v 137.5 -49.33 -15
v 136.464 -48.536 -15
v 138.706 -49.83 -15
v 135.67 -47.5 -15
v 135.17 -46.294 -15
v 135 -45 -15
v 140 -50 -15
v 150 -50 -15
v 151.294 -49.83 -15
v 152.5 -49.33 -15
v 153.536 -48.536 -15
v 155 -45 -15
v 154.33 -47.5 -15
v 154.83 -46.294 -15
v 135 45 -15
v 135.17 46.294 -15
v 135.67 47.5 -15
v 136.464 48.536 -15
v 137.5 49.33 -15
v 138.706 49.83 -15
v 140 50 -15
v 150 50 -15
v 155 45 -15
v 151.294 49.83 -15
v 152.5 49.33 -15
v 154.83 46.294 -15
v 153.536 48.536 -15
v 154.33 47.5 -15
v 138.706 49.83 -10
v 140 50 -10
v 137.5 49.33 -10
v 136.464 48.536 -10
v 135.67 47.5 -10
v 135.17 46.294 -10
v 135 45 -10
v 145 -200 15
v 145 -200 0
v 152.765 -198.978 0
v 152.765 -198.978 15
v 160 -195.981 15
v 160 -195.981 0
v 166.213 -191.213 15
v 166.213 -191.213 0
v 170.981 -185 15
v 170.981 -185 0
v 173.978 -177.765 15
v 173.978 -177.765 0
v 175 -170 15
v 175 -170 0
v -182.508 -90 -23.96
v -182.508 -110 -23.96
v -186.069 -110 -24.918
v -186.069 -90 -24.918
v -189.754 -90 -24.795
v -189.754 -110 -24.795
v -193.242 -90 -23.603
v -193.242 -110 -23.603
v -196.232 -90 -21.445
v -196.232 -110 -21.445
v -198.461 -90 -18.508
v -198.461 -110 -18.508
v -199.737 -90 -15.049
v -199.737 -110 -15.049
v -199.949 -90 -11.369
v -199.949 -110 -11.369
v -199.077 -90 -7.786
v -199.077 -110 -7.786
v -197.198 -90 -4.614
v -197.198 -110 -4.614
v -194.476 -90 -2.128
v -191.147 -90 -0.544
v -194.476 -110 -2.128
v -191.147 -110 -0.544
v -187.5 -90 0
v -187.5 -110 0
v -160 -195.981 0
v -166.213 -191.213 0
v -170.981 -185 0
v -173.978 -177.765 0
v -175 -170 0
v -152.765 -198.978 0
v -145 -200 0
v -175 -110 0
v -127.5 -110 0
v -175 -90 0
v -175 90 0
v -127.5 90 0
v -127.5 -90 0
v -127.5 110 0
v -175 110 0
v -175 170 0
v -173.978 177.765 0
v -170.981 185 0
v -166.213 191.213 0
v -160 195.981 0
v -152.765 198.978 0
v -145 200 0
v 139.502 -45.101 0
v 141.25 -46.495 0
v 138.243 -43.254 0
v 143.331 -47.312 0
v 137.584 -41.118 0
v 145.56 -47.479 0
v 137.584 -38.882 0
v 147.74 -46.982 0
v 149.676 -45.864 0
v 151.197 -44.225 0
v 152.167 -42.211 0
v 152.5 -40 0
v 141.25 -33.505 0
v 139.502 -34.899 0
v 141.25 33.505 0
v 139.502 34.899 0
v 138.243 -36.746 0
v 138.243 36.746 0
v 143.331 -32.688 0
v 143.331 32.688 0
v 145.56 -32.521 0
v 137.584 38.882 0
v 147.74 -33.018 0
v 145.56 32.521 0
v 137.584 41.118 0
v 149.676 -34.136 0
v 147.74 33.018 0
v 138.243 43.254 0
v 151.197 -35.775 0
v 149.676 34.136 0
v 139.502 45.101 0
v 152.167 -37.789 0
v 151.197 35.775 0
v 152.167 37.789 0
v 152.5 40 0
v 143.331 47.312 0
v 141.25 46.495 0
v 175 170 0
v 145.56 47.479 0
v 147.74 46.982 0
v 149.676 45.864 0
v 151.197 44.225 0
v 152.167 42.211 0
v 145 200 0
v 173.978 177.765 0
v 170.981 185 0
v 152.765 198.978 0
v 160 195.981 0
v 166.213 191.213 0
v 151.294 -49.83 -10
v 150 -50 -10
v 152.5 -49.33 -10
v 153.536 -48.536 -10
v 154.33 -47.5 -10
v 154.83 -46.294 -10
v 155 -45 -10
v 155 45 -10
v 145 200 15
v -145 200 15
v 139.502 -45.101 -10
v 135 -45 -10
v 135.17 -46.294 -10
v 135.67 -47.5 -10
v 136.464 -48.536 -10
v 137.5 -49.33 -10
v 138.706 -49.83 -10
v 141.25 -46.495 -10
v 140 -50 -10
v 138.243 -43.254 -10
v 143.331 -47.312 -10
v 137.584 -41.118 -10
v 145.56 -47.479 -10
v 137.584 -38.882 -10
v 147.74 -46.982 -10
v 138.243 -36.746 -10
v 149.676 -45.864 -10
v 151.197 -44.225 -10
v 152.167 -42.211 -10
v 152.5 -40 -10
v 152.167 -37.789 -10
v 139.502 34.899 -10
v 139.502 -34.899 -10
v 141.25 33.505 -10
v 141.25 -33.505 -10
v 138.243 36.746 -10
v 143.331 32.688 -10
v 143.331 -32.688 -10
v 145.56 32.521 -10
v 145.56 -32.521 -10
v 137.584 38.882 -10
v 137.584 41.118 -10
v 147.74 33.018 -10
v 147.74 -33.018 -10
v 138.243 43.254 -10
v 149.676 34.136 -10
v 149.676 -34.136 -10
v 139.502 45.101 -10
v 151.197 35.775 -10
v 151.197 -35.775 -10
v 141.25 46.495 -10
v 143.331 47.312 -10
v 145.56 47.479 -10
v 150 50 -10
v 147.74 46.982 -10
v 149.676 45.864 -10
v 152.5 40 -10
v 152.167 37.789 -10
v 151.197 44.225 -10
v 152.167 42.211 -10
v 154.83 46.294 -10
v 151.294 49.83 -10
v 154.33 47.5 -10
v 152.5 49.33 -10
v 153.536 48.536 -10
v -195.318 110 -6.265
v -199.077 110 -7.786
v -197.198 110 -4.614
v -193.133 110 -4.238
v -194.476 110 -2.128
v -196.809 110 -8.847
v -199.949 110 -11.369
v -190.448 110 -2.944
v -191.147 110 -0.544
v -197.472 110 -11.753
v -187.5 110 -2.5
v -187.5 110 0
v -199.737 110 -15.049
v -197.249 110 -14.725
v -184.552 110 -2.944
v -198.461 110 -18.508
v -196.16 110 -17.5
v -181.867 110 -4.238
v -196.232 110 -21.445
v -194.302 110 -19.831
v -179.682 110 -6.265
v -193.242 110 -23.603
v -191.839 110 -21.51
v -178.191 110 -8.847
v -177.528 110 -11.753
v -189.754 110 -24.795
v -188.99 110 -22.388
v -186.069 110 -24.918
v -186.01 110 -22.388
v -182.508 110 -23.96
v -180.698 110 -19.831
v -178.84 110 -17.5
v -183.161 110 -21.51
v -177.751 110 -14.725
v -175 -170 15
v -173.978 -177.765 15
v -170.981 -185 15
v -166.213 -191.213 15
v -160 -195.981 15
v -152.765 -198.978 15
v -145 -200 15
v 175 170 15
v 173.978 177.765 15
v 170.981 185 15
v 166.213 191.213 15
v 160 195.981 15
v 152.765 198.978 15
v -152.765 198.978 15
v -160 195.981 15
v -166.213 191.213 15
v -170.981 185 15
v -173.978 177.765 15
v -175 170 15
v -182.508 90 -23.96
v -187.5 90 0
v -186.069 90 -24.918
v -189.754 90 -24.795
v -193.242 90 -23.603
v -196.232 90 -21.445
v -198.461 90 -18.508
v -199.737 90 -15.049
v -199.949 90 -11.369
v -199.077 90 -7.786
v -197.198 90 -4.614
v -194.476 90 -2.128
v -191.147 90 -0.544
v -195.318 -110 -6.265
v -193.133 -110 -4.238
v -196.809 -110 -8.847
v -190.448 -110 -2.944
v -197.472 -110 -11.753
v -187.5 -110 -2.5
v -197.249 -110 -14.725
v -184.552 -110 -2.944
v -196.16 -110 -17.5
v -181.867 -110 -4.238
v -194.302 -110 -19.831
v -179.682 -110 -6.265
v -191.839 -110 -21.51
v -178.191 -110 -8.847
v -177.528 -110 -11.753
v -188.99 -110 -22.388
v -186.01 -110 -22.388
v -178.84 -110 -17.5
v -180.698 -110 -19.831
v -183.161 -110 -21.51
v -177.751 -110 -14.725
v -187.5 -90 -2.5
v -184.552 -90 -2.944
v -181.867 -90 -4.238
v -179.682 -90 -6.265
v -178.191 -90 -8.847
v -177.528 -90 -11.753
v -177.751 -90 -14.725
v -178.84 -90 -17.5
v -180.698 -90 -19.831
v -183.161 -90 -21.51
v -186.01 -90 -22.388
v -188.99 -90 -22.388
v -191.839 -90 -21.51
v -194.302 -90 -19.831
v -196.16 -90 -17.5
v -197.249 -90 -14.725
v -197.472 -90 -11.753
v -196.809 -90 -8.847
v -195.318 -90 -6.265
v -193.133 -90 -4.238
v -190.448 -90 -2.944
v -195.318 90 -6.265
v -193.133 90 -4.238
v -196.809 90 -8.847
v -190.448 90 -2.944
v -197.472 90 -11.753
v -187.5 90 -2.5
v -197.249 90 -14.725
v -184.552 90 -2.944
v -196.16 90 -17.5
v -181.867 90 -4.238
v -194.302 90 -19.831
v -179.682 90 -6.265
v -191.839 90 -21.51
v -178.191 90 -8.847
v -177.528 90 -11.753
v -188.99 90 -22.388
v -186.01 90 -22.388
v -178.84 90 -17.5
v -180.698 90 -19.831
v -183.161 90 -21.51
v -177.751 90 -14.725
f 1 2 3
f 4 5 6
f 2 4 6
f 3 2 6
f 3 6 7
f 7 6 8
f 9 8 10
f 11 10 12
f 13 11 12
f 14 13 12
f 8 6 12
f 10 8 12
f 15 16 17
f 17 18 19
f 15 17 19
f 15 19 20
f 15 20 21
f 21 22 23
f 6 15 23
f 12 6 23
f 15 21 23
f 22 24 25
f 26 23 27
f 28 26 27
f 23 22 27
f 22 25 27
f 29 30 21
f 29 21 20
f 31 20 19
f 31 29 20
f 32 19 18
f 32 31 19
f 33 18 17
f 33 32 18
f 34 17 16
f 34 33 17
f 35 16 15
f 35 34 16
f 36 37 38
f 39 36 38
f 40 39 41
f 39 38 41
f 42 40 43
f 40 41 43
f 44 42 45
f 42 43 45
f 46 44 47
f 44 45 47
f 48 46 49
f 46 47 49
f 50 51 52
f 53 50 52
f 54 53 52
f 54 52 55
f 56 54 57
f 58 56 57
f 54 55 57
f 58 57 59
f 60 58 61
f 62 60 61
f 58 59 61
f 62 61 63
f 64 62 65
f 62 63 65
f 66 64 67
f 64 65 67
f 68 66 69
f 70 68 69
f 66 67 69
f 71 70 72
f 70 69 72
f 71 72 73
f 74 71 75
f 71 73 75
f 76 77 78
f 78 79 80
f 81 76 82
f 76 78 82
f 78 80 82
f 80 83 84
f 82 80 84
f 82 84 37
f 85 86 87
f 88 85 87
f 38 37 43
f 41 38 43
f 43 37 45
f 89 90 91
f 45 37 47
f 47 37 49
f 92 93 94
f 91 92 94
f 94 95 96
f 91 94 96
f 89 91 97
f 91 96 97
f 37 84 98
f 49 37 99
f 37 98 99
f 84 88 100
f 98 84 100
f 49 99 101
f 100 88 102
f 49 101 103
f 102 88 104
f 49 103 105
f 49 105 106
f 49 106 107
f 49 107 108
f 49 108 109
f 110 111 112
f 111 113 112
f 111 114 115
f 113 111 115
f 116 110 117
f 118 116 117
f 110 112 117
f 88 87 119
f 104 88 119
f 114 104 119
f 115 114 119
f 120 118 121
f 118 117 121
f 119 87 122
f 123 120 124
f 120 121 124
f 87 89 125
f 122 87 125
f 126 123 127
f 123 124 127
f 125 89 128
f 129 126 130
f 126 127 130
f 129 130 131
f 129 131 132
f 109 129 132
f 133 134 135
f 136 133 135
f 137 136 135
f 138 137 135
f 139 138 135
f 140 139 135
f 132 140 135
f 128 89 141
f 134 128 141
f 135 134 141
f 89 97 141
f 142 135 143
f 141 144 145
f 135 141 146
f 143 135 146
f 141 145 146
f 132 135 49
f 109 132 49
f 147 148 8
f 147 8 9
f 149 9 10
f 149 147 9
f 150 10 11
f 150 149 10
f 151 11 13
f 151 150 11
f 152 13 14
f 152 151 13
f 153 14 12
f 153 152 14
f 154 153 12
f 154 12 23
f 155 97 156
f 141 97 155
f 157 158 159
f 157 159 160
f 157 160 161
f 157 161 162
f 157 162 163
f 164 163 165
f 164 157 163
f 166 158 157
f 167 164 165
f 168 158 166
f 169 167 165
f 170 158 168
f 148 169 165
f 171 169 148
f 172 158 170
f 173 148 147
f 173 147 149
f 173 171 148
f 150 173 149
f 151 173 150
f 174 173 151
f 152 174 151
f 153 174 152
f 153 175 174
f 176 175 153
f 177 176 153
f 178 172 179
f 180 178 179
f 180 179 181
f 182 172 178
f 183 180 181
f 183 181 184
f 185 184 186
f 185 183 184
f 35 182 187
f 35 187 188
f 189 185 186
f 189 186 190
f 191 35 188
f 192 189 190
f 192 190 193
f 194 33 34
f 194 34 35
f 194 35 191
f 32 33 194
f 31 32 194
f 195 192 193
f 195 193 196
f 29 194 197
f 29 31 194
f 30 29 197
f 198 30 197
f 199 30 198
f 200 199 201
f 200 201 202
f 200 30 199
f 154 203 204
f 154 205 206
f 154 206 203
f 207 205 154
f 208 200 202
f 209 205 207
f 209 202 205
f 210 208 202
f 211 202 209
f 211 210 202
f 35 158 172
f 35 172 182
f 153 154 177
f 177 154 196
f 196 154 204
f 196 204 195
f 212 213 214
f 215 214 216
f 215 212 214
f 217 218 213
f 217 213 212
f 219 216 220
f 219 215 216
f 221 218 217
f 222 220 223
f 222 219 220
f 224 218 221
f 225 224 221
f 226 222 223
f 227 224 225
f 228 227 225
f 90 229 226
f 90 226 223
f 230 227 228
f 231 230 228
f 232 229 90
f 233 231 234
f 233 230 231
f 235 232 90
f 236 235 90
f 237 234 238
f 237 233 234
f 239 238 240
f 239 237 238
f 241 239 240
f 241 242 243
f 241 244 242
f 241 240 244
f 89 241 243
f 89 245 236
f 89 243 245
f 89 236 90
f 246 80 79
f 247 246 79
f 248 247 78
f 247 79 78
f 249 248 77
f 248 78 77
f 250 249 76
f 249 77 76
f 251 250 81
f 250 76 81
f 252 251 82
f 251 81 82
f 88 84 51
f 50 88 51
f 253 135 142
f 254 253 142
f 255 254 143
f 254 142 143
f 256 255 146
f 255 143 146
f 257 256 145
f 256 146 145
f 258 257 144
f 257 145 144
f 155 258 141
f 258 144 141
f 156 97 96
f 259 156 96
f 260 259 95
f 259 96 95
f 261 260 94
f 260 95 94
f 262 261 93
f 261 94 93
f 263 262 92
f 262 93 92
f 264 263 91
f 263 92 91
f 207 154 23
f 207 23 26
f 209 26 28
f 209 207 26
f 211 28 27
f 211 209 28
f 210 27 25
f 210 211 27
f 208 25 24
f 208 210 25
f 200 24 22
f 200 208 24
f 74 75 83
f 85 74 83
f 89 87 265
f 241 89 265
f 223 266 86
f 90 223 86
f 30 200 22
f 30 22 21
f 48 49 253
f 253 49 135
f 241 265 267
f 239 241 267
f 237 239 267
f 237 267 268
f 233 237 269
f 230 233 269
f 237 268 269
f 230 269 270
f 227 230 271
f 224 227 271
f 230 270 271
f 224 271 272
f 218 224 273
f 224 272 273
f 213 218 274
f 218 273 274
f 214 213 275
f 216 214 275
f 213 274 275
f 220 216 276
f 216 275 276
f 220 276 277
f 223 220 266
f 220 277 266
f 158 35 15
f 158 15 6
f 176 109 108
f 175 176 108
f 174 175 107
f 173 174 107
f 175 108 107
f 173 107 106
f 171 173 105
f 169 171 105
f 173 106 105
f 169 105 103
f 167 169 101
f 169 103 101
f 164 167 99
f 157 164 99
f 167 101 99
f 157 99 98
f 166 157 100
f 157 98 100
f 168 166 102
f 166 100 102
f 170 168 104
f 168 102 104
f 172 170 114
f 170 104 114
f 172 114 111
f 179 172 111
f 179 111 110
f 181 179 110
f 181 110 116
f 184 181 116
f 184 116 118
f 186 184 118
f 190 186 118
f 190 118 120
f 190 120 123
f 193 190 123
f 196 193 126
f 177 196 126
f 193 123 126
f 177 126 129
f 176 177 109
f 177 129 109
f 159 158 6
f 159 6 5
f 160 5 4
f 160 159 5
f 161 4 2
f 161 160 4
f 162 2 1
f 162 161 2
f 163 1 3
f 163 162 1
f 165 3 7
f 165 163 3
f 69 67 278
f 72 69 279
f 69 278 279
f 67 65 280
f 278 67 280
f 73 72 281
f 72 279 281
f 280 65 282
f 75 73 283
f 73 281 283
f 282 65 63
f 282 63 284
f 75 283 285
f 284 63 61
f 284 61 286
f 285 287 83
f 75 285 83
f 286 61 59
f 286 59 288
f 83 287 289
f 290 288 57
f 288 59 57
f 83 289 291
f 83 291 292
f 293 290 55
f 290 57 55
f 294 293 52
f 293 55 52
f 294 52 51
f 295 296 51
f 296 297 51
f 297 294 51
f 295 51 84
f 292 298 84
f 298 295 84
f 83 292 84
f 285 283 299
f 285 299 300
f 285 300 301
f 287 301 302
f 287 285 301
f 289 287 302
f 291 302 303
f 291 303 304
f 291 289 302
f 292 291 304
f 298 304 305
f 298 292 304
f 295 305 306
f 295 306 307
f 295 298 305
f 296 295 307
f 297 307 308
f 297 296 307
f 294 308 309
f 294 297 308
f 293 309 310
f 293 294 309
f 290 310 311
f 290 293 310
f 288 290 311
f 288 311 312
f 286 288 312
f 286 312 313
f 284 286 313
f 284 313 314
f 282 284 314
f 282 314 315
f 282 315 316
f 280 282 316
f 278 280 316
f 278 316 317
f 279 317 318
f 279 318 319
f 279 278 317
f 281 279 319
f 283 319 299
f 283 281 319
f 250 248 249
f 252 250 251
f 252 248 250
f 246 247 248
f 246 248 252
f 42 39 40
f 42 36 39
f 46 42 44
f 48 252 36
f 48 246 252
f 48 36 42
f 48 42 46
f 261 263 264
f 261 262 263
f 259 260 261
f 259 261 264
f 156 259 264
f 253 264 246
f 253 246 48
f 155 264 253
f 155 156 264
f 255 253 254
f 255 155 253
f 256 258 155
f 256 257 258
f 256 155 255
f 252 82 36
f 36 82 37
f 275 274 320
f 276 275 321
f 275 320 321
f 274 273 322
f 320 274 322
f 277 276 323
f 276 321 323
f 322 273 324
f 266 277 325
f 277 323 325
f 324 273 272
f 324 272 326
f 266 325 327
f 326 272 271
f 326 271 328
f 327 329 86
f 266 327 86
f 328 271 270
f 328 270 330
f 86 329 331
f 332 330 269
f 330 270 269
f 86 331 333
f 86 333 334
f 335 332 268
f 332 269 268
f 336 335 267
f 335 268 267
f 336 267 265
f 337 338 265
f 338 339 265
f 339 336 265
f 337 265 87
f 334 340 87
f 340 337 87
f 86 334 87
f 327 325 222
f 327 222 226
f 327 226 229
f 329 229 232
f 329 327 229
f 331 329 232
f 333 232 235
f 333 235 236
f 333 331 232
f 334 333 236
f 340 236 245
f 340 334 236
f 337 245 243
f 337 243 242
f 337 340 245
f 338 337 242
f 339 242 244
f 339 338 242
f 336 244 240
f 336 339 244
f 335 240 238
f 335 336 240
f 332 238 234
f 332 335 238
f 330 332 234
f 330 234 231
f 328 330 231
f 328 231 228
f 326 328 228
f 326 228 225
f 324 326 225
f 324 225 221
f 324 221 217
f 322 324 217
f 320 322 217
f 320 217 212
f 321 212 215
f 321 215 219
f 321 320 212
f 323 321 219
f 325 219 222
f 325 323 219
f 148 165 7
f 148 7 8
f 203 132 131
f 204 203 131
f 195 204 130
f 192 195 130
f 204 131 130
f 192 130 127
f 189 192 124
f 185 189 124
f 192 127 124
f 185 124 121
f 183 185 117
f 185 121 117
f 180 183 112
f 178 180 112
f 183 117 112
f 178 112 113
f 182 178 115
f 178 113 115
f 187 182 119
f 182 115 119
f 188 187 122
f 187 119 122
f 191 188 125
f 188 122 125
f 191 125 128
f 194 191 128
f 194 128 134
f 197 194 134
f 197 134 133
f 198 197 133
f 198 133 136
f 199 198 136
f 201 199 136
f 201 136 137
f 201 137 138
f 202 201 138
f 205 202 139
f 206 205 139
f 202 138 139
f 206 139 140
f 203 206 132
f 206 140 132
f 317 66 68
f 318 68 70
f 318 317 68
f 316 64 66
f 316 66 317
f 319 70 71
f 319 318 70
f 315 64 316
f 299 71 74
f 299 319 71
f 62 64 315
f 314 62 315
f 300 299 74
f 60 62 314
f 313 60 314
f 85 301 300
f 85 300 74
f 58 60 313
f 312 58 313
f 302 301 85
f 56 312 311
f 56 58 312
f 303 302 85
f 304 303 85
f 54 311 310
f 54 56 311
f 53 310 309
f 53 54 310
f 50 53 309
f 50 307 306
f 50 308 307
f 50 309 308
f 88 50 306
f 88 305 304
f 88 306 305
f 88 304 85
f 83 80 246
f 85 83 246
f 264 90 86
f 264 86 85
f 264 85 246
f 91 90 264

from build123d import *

# Parameters (mm, degrees)
SKETCH1_W                = 350
SKETCH1_H                = 400
BOSS_EXTRUDE1_DEPTH      = 15
BOSS_EXTRUDE2_DEPTH      = 10
BOSS_EXTRUDE2_DEPTH_BACK = 10
SKETCH3_R                = 12.5
SKETCH3_R_2              = 10
BOSS_EXTRUDE3_DEPTH      = 10
BOSS_EXTRUDE3_DEPTH_BACK = 10
SKETCH4_R                = 12.5
SKETCH4_R_2              = 10
CUT_EXTRUDE1_DEPTH       = 74
SKETCH6_R                = 7.5
BOSS_EXTRUDE4_DEPTH      = 10
BOSS_EXTRUDE5_DEPTH      = 5


with BuildPart() as part:
    # Sketch1 → Boss-Extrude1 (new body)
    with BuildSketch(Plane.XY):
        Rectangle(SKETCH1_W, SKETCH1_H)
    extrude(amount=BOSS_EXTRUDE1_DEPTH)

    # Sketch3 → Boss-Extrude2 (add, two sides: drawn at the far end of the back side and taken through both)
    # profile 1 of 2: a face of its own
    with BuildSketch(Plane(origin=(0, 100, 0), x_dir=(1, 0, 0), z_dir=(0, 1, 0)).offset(-BOSS_EXTRUDE2_DEPTH_BACK)):
        with BuildLine():
            ThreePointArc((-175, 12.5), (-178.661165235, 3.661165235), (-187.5, 0))
            Line((-187.5, 0), (-127.5, 0))
            Line((-127.5, 0), (-182.508319468, 23.960066556))
            ThreePointArc((-182.508319468, 23.960066556), (-177.04423588, 19.350328216), (-175, 12.5))
        make_face()
    # profile 2 of 2: a face of its own
    with BuildSketch(Plane(origin=(0, 100, 0), x_dir=(1, 0, 0), z_dir=(0, 1, 0)).offset(-BOSS_EXTRUDE2_DEPTH_BACK)):
        with Locations((-187.5, 12.5)):
            Circle(SKETCH3_R)
        with Locations(Location((-187.5, 12.5, 0), (0, 0, 270))):
            Circle(SKETCH3_R_2, mode=Mode.SUBTRACT)
    extrude(amount=BOSS_EXTRUDE2_DEPTH + BOSS_EXTRUDE2_DEPTH_BACK)

    # Sketch4 → Boss-Extrude3 (add, two sides: drawn at the far end of the back side and taken through both)
    # profile 1 of 2: a face of its own
    with BuildSketch(Plane(origin=(0, -100, 0), x_dir=(1, 0, 0), z_dir=(0, 1, 0)).offset(-BOSS_EXTRUDE3_DEPTH_BACK)):
        with Locations((-187.5, 12.5)):
            Circle(SKETCH4_R)
        with Locations(Location((-187.5, 12.5, 0), (0, 0, 270))):
            Circle(SKETCH4_R_2, mode=Mode.SUBTRACT)
    # profile 2 of 2: a face of its own
    with BuildSketch(Plane(origin=(0, -100, 0), x_dir=(1, 0, 0), z_dir=(0, 1, 0)).offset(-BOSS_EXTRUDE3_DEPTH_BACK)):
        with BuildLine():
            Line((-127.5, 0), (-182.508319468, 23.960066556))
            ThreePointArc((-182.508319468, 23.960066556), (-177.04423588, 19.350328216), (-175, 12.5))
            ThreePointArc((-175, 12.5), (-178.661165235, 3.661165235), (-187.5, 0))
            Line((-187.5, 0), (-127.5, 0))
        make_face()
    extrude(amount=BOSS_EXTRUDE3_DEPTH + BOSS_EXTRUDE3_DEPTH_BACK)

    # Sketch5 → Cut-Extrude1 (cut)
    with BuildSketch(Plane(origin=(0, 0, 0), x_dir=(-1, 0, 0), z_dir=(0, 0, -1))):
        with BuildLine():
            Line((-175, 200), (-175, 170))
            ThreePointArc((-175, 170), (-166.213203436, 191.213203436), (-145, 200))
            Line((-145, 200), (-175, 200))
        make_face()
        with BuildLine():
            ThreePointArc((-145, -200), (-166.213203436, -191.213203436), (-175, -170))
            Line((-175, -170), (-175, -200))
            Line((-175, -200), (-145, -200))
        make_face()
        with BuildLine():
            ThreePointArc((175, -170), (166.213203436, -191.213203436), (145, -200))
            Line((145, -200), (175, -200))
            Line((175, -200), (175, -170))
        make_face()
        with BuildLine():
            Line((175, 200), (145, 200))
            ThreePointArc((145, 200), (166.213203436, 191.213203436), (175, 170))
            Line((175, 170), (175, 200))
        make_face()
    extrude(amount=-CUT_EXTRUDE1_DEPTH, mode=Mode.SUBTRACT)

    # Sketch6 → Boss-Extrude4 (add)
    with BuildSketch(Plane(origin=(0, 0, 0), x_dir=(-1, 0, 0), z_dir=(0, 0, -1))):
        with Locations(Location((-145, 40, 0), (0, 0, 180))):
            Circle(SKETCH6_R)
        with Locations(Location((-145, -40, 0), (0, 0, 180))):
            Circle(SKETCH6_R)
    extrude(amount=BOSS_EXTRUDE4_DEPTH)

    # Sketch7 → Boss-Extrude5 (add)
    with BuildSketch(Plane(origin=(0, 0, -10), x_dir=(-1, 0, 0), z_dir=(0, 0, -1))):
        with BuildLine():
            Line((-150, 50), (-140, 50))
            ThreePointArc((-140, 50), (-136.464466094, 48.535533906), (-135, 45))
            Line((-135, 45), (-135, -45))
            ThreePointArc((-135, -45), (-136.464466094, -48.535533906), (-140, -50))
            Line((-140, -50), (-150, -50))
            ThreePointArc((-150, -50), (-153.535533906, -48.535533906), (-155, -45))
            Line((-155, -45), (-155, 45))
            ThreePointArc((-155, 45), (-153.535533906, 48.535533906), (-150, 50))
        make_face()
    extrude(amount=BOSS_EXTRUDE5_DEPTH)


solid = part.part
